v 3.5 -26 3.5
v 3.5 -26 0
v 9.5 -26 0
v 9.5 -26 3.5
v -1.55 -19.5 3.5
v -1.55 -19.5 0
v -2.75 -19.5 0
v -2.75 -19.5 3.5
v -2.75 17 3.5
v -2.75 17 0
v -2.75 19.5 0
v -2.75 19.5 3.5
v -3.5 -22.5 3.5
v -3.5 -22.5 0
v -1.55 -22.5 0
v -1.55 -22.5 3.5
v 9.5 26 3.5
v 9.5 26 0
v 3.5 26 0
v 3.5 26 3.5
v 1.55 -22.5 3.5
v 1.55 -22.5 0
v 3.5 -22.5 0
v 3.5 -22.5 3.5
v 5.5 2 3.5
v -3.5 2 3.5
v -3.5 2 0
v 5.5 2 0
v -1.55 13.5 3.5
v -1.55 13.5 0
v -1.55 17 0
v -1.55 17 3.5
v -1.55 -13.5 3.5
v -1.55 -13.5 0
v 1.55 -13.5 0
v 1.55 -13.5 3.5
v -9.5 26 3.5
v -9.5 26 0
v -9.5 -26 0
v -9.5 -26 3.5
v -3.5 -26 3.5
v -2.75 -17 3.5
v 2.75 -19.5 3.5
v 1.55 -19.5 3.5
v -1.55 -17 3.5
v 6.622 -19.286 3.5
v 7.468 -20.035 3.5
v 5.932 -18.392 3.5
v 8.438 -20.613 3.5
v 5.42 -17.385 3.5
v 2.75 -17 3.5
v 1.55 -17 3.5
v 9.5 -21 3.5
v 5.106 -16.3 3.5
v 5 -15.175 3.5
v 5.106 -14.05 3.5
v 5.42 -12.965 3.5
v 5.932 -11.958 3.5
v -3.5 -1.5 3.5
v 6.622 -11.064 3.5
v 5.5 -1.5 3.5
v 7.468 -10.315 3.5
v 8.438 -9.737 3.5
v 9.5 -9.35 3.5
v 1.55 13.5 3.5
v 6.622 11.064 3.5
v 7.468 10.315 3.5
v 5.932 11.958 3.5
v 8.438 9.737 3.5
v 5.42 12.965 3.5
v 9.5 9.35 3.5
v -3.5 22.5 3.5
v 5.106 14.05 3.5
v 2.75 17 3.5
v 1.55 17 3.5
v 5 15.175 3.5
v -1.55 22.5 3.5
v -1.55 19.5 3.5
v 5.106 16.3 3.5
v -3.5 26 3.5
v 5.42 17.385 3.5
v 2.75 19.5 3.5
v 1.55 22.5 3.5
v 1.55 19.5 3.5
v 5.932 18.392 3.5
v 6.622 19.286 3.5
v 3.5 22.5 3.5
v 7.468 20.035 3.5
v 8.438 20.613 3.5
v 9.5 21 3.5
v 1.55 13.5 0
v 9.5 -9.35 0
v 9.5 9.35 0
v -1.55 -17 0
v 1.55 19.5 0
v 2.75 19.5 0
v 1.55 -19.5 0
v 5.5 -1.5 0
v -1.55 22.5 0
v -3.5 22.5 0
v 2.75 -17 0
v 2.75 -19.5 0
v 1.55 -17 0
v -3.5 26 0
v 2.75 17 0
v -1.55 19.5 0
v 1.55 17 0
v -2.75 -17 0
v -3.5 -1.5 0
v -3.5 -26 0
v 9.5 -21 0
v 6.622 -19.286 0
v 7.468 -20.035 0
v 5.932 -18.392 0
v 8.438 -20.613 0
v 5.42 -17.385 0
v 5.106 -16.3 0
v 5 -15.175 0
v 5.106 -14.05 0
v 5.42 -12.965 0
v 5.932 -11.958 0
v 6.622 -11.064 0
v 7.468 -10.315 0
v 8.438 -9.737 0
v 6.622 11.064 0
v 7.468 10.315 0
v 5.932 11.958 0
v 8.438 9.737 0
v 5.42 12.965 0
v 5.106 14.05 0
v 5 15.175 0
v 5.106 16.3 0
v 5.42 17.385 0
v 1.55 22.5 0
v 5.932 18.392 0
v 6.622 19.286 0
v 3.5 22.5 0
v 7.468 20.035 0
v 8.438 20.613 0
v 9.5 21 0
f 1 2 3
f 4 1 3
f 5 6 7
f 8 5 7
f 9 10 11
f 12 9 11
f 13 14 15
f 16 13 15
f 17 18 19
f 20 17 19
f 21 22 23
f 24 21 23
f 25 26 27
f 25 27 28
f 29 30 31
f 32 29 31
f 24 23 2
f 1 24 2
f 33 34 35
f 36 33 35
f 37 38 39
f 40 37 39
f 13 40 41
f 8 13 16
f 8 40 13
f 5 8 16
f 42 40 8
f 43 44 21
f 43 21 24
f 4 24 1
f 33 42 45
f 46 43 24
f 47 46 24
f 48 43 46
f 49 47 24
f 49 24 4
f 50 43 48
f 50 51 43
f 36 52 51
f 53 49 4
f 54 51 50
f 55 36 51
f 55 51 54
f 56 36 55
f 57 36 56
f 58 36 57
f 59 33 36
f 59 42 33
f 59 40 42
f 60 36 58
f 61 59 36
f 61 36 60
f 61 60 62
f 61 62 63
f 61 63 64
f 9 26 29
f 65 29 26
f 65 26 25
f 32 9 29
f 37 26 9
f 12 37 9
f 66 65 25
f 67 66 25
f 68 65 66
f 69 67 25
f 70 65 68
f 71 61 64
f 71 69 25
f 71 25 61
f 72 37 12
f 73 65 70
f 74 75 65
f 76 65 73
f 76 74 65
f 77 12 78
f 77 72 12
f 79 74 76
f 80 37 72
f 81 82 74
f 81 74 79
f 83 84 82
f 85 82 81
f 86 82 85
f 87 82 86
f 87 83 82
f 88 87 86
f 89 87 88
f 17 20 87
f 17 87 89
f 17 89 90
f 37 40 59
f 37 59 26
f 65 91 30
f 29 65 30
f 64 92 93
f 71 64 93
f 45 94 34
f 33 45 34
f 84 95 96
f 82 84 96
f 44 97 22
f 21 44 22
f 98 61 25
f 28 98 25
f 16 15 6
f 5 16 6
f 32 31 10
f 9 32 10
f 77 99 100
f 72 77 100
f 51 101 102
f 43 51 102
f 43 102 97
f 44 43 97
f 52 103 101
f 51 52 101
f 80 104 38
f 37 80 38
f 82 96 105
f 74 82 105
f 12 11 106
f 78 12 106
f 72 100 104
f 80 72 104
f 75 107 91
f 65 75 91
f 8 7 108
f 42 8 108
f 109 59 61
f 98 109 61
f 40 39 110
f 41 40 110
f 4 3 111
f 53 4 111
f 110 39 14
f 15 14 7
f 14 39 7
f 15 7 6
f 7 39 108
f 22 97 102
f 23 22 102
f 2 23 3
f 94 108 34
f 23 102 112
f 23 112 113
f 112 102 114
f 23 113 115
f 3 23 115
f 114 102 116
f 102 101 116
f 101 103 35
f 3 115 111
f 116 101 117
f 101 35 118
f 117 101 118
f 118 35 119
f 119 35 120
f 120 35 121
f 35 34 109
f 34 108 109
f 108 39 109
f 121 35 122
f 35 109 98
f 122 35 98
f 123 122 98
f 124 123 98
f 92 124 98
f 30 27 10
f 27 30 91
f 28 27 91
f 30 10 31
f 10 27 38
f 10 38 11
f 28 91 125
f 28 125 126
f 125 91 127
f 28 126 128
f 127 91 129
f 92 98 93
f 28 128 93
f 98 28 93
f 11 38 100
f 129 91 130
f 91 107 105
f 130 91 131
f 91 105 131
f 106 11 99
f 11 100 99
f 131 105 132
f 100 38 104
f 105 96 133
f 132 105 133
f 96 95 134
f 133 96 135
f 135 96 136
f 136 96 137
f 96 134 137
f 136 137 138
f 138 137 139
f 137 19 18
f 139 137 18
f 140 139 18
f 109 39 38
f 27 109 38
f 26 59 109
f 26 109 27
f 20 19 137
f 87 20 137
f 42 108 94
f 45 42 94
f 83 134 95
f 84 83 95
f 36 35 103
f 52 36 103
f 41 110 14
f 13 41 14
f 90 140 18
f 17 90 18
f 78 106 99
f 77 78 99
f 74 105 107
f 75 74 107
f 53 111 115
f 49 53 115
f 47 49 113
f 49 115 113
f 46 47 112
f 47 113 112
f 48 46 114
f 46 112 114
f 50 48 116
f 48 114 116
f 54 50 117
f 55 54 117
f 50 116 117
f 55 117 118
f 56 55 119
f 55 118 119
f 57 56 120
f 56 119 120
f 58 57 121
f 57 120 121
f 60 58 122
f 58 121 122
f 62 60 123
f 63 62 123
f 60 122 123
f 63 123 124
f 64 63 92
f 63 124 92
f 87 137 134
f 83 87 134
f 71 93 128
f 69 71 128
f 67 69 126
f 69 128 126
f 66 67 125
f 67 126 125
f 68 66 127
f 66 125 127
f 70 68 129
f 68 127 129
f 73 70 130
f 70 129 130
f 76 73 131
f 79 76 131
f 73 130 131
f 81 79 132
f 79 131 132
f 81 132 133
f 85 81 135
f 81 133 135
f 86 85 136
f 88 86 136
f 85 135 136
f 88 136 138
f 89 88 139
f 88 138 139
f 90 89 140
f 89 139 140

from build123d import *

# Parameters (mm, degrees)
BOSS_EXTRUDE1_DEPTH = 3.5
SKETCH2_W           = 9
SKETCH2_H           = 3.5
CUT_EXTRUDE1_DEPTH  = 28.901612857


with BuildPart() as part:
    # Sketch1 → Boss-Extrude1 (new body)
    with BuildSketch(Plane.XY):
        with BuildLine():
            Line((3.5, 26), (3.5, 22.5))
            Line((3.5, 22.5), (1.55, 22.5))
            Line((1.55, 22.5), (1.55, 19.5))
            Line((1.55, 19.5), (2.75, 19.5))
            Line((2.75, 19.5), (2.75, 17))
            Line((2.75, 17), (1.55, 17))
            Line((1.55, 17), (1.55, 13.5))
            Line((1.55, 13.5), (-1.55, 13.5))
            Line((-1.55, 13.5), (-1.55, 17))
            Line((-1.55, 17), (-2.75, 17))
            Line((-2.75, 17), (-2.75, 19.5))
            Line((-2.75, 19.5), (-1.55, 19.5))
            Line((-1.55, 19.5), (-1.55, 22.5))
            Line((-1.55, 22.5), (-3.5, 22.5))
            Line((-3.5, 22.5), (-3.5, 26))
            Line((-3.5, 26), (-9.5, 26))
            Line((-9.5, 26), (-9.5, -26))
            Line((-9.5, -26), (-3.5, -26))
            Line((-3.5, -26), (-3.5, -22.5))
            Line((-3.5, -22.5), (-1.55, -22.5))
            Line((-1.55, -22.5), (-1.55, -19.5))
            Line((-1.55, -19.5), (-2.75, -19.5))
            Line((-2.75, -19.5), (-2.75, -17))
            Line((-2.75, -17), (-1.55, -17))
            Line((-1.55, -17), (-1.55, -13.5))
            Line((-1.55, -13.5), (1.55, -13.5))
            Line((1.55, -13.5), (1.55, -17))
            Line((1.55, -17), (2.75, -17))
            Line((2.75, -17), (2.75, -19.5))
            Line((2.75, -19.5), (1.55, -19.5))
            Line((1.55, -19.5), (1.55, -22.5))
            Line((1.55, -22.5), (3.5, -22.5))
            Line((3.5, -22.5), (3.5, -26))
            Line((3.5, -26), (9.5, -26))
            Line((9.5, -26), (9.5, -21))
            ThreePointArc((9.5, -21), (5, -15.175053648), (9.5, -9.350107297))
            Line((9.5, -9.350107297), (9.5, 9.350107297))
            ThreePointArc((9.5, 9.350107297), (5, 15.175053648), (9.5, 21))
            Line((9.5, 21), (9.5, 26))
            Line((9.5, 26), (3.5, 26))
        make_face()
    extrude(amount=BOSS_EXTRUDE1_DEPTH)

    # Sketch2 → Cut-Extrude1 (cut, through all)
    with BuildSketch(Plane.XY.offset(3.5)):
        with Locations((1, 0.25)):
            Rectangle(SKETCH2_W, SKETCH2_H)
    extrude(amount=-CUT_EXTRUDE1_DEPTH, mode=Mode.SUBTRACT)


solid = part.part
